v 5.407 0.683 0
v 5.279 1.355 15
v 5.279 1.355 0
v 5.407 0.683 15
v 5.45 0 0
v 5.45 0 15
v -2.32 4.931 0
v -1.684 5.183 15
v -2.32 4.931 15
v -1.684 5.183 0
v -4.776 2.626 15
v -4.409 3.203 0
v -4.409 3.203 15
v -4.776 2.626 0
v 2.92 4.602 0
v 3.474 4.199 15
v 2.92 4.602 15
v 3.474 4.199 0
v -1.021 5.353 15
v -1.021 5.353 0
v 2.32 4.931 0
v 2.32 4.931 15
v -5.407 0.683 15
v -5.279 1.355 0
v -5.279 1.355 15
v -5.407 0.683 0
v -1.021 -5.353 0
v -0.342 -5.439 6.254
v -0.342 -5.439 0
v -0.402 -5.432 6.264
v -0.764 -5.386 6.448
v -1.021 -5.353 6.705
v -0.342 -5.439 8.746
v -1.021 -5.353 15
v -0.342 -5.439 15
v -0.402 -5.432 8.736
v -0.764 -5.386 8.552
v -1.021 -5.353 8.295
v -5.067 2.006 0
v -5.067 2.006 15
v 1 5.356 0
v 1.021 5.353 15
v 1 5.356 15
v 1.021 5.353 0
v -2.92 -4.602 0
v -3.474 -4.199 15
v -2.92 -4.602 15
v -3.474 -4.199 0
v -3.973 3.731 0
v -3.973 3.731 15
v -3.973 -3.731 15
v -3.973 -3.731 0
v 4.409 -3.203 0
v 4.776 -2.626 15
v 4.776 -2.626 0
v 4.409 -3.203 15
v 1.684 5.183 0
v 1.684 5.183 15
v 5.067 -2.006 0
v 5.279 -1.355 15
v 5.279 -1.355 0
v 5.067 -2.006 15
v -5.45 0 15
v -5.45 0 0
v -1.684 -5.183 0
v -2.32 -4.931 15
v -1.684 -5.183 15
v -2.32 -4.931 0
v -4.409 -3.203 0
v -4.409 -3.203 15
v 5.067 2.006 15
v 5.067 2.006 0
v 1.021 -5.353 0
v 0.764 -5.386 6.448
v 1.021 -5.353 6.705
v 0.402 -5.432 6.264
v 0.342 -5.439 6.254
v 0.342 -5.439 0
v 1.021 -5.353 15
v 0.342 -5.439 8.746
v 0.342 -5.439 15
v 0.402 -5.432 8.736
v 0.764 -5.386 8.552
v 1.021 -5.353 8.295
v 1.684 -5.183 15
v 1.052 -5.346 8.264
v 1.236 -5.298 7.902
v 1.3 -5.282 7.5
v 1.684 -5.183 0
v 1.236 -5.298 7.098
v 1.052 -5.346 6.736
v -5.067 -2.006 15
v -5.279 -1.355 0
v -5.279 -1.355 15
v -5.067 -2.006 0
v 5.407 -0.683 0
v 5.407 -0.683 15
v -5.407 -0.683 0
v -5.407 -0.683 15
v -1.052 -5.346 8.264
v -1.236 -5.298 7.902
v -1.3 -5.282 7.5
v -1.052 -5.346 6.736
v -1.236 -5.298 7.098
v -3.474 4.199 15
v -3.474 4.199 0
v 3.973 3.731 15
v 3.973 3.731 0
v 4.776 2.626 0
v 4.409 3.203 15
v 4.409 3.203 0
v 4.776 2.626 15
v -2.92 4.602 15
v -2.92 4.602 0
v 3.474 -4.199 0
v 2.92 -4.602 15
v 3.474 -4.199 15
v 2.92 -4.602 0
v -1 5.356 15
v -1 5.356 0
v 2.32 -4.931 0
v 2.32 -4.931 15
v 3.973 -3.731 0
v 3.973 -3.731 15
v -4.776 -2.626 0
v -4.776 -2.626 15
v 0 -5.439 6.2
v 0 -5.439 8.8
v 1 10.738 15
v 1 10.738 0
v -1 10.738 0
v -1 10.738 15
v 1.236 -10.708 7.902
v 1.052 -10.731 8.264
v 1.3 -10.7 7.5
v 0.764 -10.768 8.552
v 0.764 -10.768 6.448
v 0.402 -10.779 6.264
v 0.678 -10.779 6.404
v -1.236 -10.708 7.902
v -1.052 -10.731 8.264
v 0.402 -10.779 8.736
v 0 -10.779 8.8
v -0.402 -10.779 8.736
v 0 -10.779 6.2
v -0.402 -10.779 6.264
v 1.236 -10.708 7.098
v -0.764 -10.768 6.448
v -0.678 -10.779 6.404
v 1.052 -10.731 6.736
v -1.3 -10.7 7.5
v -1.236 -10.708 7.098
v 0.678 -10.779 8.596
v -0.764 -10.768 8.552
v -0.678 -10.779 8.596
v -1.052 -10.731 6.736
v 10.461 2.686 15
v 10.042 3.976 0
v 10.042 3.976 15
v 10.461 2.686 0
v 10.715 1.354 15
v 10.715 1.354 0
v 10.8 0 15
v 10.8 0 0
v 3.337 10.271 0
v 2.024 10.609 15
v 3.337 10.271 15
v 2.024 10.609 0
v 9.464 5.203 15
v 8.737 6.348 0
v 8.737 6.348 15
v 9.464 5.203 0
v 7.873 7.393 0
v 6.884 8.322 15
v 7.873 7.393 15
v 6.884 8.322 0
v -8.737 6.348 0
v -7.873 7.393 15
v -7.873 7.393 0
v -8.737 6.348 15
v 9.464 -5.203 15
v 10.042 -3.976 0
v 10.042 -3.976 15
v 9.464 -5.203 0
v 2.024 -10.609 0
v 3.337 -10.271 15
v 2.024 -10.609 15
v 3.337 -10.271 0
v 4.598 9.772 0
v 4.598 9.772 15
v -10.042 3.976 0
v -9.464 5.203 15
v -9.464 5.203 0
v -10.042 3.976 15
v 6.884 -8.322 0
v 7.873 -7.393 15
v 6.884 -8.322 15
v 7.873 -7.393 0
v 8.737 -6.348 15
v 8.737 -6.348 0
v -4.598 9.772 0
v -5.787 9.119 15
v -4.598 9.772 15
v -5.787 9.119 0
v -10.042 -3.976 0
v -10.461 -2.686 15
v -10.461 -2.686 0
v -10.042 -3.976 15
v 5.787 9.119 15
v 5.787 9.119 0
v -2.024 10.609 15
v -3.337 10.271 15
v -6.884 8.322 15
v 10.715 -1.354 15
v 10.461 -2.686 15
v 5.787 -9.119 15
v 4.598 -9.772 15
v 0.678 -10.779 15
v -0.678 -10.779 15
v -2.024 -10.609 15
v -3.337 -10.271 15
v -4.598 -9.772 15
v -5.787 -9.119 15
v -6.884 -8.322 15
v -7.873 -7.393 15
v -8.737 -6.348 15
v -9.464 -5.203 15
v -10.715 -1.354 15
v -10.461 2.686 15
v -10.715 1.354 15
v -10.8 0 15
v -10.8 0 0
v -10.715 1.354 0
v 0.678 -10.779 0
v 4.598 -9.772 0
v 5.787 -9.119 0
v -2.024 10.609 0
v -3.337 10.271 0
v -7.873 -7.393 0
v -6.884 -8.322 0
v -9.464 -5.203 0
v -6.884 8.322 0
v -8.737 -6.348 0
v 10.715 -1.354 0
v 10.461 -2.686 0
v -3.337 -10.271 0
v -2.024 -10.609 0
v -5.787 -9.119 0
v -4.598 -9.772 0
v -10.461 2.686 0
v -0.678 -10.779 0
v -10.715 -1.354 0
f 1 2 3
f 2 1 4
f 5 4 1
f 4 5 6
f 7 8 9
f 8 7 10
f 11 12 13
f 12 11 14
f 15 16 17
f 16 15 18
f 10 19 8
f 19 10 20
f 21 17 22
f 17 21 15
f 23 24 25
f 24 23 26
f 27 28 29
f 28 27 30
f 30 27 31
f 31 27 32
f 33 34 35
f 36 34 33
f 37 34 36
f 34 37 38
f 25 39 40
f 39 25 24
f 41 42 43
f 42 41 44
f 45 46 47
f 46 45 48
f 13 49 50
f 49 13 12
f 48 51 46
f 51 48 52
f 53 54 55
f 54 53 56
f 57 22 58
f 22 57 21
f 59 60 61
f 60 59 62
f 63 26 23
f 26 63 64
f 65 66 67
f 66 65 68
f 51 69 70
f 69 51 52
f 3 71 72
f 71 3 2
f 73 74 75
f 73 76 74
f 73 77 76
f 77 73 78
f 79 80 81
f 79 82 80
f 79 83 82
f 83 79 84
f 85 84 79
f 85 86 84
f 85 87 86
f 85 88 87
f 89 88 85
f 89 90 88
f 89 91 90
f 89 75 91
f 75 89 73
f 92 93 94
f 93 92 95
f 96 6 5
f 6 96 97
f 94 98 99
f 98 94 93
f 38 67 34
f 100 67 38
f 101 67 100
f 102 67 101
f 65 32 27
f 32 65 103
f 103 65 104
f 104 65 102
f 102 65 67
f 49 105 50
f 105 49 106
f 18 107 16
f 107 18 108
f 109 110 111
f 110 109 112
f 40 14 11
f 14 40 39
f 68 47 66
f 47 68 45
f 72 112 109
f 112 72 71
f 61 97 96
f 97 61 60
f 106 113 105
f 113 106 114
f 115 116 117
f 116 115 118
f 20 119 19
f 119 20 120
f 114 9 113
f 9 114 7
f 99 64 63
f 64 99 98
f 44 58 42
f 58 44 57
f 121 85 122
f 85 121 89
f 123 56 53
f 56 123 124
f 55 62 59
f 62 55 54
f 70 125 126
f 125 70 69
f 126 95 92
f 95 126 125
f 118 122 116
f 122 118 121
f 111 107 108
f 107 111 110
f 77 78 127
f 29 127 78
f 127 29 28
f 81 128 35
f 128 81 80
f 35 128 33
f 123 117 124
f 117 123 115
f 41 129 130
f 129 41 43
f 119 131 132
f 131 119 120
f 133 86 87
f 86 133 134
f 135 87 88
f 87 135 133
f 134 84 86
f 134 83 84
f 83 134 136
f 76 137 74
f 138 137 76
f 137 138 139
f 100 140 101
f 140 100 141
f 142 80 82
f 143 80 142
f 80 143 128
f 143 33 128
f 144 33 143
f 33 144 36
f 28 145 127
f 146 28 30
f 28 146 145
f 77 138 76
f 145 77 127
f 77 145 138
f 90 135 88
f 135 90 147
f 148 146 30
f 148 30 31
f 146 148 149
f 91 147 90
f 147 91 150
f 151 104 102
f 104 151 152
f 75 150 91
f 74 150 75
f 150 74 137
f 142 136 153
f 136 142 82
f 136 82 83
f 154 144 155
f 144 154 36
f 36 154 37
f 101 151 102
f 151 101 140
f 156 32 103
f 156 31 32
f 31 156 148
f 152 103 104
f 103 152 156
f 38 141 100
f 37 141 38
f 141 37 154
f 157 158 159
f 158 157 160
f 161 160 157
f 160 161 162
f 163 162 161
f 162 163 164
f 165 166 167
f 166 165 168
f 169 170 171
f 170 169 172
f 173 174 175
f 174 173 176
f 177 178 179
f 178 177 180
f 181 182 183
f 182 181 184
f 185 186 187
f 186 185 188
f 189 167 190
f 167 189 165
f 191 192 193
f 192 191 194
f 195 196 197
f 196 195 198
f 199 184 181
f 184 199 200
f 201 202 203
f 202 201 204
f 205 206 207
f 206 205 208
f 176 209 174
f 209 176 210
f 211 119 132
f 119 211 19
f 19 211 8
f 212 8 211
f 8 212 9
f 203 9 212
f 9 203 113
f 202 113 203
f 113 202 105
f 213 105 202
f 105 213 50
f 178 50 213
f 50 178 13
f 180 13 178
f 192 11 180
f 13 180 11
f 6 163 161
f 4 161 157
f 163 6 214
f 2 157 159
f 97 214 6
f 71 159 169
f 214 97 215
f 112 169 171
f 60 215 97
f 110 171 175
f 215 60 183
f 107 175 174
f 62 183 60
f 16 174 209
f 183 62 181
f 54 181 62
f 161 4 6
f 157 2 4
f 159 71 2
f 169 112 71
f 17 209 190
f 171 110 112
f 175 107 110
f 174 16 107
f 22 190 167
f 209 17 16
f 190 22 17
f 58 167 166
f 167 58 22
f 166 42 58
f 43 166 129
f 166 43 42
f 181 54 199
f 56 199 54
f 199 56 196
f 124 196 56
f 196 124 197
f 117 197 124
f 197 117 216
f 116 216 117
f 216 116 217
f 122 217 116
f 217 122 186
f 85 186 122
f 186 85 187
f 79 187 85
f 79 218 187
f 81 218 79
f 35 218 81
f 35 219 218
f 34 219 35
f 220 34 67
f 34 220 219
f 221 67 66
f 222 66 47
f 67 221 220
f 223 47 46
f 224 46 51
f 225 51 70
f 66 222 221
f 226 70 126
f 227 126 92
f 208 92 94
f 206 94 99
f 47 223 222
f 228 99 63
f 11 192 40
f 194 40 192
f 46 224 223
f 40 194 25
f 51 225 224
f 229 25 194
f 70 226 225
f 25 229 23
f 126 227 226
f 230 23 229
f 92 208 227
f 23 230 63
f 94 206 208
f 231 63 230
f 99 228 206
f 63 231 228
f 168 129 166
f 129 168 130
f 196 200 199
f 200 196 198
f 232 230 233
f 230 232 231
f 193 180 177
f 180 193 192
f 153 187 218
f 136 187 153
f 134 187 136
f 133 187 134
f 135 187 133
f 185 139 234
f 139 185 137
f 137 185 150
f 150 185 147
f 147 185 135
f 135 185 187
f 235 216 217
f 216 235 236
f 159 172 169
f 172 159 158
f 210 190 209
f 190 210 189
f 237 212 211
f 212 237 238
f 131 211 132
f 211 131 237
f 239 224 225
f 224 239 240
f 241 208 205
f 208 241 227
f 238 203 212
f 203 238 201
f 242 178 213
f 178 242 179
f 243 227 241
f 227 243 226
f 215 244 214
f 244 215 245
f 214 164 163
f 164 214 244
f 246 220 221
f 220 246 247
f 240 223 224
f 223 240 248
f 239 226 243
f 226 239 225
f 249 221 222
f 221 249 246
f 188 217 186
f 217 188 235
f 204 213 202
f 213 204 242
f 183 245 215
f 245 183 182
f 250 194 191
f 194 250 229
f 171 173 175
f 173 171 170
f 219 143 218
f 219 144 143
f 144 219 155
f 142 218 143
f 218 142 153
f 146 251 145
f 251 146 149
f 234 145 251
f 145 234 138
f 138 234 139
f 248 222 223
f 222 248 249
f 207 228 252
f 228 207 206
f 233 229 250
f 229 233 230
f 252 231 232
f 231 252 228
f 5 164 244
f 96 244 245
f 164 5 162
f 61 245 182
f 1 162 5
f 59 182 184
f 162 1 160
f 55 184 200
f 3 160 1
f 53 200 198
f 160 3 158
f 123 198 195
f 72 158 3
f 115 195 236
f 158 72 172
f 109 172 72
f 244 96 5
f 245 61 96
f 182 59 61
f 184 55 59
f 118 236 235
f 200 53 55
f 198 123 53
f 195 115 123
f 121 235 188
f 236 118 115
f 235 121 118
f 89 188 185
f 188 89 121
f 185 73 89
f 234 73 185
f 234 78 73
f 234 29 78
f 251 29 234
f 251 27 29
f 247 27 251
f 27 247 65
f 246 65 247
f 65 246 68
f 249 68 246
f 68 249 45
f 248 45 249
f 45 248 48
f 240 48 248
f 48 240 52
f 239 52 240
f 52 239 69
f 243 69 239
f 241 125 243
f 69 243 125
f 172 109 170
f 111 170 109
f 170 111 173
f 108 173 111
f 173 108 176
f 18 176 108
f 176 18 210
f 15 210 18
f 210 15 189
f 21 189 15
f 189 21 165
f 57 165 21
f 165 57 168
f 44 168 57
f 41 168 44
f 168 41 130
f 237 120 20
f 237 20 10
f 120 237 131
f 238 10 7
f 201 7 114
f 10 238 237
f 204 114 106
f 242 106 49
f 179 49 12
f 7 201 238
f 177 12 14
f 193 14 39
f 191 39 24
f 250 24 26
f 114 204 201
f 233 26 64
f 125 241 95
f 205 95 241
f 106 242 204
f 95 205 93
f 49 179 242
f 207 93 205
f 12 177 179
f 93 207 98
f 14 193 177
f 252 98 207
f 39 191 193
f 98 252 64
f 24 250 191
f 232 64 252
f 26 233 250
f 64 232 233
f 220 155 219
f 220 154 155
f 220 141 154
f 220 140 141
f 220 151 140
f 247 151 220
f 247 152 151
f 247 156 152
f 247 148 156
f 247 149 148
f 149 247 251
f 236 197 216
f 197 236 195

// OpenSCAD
//Diameter of the stylus
stylusDiameter=10.5;

//Tolerance (to OD and ID)
tolerance=0.2;

penAdapter();

module penAdapter(mountDiameter=22, mountHeight=15)
{

    difference () {
    
        cylinder(r=mountDiameter/2-tolerance, h= mountHeight, $fn=50);

        union () {
            stylusMount();
            space();
            m3Hole();
        }
    }
} 


module stylusMount (mountHeight=15) {

    translate([0,0,-1]) cylinder(r=stylusDiameter/2+tolerance, mountHeight+2, $fn=50);      
}

module space (mountDiameter=22, mountHeight=15, spaceSize=2) {
    
    translate([0,mountDiameter/2,mountHeight/2-1]) cube(size = [spaceSize, mountDiameter, mountHeight+10], center=true);
}

module m3Hole (mountHeight=15,mountDiameter=22) {
    
        rotate([90,0,0]) translate([0,mountHeight/2,0]) cylinder(r=2.6/2, mountDiameter/2, $fn=20);
}
